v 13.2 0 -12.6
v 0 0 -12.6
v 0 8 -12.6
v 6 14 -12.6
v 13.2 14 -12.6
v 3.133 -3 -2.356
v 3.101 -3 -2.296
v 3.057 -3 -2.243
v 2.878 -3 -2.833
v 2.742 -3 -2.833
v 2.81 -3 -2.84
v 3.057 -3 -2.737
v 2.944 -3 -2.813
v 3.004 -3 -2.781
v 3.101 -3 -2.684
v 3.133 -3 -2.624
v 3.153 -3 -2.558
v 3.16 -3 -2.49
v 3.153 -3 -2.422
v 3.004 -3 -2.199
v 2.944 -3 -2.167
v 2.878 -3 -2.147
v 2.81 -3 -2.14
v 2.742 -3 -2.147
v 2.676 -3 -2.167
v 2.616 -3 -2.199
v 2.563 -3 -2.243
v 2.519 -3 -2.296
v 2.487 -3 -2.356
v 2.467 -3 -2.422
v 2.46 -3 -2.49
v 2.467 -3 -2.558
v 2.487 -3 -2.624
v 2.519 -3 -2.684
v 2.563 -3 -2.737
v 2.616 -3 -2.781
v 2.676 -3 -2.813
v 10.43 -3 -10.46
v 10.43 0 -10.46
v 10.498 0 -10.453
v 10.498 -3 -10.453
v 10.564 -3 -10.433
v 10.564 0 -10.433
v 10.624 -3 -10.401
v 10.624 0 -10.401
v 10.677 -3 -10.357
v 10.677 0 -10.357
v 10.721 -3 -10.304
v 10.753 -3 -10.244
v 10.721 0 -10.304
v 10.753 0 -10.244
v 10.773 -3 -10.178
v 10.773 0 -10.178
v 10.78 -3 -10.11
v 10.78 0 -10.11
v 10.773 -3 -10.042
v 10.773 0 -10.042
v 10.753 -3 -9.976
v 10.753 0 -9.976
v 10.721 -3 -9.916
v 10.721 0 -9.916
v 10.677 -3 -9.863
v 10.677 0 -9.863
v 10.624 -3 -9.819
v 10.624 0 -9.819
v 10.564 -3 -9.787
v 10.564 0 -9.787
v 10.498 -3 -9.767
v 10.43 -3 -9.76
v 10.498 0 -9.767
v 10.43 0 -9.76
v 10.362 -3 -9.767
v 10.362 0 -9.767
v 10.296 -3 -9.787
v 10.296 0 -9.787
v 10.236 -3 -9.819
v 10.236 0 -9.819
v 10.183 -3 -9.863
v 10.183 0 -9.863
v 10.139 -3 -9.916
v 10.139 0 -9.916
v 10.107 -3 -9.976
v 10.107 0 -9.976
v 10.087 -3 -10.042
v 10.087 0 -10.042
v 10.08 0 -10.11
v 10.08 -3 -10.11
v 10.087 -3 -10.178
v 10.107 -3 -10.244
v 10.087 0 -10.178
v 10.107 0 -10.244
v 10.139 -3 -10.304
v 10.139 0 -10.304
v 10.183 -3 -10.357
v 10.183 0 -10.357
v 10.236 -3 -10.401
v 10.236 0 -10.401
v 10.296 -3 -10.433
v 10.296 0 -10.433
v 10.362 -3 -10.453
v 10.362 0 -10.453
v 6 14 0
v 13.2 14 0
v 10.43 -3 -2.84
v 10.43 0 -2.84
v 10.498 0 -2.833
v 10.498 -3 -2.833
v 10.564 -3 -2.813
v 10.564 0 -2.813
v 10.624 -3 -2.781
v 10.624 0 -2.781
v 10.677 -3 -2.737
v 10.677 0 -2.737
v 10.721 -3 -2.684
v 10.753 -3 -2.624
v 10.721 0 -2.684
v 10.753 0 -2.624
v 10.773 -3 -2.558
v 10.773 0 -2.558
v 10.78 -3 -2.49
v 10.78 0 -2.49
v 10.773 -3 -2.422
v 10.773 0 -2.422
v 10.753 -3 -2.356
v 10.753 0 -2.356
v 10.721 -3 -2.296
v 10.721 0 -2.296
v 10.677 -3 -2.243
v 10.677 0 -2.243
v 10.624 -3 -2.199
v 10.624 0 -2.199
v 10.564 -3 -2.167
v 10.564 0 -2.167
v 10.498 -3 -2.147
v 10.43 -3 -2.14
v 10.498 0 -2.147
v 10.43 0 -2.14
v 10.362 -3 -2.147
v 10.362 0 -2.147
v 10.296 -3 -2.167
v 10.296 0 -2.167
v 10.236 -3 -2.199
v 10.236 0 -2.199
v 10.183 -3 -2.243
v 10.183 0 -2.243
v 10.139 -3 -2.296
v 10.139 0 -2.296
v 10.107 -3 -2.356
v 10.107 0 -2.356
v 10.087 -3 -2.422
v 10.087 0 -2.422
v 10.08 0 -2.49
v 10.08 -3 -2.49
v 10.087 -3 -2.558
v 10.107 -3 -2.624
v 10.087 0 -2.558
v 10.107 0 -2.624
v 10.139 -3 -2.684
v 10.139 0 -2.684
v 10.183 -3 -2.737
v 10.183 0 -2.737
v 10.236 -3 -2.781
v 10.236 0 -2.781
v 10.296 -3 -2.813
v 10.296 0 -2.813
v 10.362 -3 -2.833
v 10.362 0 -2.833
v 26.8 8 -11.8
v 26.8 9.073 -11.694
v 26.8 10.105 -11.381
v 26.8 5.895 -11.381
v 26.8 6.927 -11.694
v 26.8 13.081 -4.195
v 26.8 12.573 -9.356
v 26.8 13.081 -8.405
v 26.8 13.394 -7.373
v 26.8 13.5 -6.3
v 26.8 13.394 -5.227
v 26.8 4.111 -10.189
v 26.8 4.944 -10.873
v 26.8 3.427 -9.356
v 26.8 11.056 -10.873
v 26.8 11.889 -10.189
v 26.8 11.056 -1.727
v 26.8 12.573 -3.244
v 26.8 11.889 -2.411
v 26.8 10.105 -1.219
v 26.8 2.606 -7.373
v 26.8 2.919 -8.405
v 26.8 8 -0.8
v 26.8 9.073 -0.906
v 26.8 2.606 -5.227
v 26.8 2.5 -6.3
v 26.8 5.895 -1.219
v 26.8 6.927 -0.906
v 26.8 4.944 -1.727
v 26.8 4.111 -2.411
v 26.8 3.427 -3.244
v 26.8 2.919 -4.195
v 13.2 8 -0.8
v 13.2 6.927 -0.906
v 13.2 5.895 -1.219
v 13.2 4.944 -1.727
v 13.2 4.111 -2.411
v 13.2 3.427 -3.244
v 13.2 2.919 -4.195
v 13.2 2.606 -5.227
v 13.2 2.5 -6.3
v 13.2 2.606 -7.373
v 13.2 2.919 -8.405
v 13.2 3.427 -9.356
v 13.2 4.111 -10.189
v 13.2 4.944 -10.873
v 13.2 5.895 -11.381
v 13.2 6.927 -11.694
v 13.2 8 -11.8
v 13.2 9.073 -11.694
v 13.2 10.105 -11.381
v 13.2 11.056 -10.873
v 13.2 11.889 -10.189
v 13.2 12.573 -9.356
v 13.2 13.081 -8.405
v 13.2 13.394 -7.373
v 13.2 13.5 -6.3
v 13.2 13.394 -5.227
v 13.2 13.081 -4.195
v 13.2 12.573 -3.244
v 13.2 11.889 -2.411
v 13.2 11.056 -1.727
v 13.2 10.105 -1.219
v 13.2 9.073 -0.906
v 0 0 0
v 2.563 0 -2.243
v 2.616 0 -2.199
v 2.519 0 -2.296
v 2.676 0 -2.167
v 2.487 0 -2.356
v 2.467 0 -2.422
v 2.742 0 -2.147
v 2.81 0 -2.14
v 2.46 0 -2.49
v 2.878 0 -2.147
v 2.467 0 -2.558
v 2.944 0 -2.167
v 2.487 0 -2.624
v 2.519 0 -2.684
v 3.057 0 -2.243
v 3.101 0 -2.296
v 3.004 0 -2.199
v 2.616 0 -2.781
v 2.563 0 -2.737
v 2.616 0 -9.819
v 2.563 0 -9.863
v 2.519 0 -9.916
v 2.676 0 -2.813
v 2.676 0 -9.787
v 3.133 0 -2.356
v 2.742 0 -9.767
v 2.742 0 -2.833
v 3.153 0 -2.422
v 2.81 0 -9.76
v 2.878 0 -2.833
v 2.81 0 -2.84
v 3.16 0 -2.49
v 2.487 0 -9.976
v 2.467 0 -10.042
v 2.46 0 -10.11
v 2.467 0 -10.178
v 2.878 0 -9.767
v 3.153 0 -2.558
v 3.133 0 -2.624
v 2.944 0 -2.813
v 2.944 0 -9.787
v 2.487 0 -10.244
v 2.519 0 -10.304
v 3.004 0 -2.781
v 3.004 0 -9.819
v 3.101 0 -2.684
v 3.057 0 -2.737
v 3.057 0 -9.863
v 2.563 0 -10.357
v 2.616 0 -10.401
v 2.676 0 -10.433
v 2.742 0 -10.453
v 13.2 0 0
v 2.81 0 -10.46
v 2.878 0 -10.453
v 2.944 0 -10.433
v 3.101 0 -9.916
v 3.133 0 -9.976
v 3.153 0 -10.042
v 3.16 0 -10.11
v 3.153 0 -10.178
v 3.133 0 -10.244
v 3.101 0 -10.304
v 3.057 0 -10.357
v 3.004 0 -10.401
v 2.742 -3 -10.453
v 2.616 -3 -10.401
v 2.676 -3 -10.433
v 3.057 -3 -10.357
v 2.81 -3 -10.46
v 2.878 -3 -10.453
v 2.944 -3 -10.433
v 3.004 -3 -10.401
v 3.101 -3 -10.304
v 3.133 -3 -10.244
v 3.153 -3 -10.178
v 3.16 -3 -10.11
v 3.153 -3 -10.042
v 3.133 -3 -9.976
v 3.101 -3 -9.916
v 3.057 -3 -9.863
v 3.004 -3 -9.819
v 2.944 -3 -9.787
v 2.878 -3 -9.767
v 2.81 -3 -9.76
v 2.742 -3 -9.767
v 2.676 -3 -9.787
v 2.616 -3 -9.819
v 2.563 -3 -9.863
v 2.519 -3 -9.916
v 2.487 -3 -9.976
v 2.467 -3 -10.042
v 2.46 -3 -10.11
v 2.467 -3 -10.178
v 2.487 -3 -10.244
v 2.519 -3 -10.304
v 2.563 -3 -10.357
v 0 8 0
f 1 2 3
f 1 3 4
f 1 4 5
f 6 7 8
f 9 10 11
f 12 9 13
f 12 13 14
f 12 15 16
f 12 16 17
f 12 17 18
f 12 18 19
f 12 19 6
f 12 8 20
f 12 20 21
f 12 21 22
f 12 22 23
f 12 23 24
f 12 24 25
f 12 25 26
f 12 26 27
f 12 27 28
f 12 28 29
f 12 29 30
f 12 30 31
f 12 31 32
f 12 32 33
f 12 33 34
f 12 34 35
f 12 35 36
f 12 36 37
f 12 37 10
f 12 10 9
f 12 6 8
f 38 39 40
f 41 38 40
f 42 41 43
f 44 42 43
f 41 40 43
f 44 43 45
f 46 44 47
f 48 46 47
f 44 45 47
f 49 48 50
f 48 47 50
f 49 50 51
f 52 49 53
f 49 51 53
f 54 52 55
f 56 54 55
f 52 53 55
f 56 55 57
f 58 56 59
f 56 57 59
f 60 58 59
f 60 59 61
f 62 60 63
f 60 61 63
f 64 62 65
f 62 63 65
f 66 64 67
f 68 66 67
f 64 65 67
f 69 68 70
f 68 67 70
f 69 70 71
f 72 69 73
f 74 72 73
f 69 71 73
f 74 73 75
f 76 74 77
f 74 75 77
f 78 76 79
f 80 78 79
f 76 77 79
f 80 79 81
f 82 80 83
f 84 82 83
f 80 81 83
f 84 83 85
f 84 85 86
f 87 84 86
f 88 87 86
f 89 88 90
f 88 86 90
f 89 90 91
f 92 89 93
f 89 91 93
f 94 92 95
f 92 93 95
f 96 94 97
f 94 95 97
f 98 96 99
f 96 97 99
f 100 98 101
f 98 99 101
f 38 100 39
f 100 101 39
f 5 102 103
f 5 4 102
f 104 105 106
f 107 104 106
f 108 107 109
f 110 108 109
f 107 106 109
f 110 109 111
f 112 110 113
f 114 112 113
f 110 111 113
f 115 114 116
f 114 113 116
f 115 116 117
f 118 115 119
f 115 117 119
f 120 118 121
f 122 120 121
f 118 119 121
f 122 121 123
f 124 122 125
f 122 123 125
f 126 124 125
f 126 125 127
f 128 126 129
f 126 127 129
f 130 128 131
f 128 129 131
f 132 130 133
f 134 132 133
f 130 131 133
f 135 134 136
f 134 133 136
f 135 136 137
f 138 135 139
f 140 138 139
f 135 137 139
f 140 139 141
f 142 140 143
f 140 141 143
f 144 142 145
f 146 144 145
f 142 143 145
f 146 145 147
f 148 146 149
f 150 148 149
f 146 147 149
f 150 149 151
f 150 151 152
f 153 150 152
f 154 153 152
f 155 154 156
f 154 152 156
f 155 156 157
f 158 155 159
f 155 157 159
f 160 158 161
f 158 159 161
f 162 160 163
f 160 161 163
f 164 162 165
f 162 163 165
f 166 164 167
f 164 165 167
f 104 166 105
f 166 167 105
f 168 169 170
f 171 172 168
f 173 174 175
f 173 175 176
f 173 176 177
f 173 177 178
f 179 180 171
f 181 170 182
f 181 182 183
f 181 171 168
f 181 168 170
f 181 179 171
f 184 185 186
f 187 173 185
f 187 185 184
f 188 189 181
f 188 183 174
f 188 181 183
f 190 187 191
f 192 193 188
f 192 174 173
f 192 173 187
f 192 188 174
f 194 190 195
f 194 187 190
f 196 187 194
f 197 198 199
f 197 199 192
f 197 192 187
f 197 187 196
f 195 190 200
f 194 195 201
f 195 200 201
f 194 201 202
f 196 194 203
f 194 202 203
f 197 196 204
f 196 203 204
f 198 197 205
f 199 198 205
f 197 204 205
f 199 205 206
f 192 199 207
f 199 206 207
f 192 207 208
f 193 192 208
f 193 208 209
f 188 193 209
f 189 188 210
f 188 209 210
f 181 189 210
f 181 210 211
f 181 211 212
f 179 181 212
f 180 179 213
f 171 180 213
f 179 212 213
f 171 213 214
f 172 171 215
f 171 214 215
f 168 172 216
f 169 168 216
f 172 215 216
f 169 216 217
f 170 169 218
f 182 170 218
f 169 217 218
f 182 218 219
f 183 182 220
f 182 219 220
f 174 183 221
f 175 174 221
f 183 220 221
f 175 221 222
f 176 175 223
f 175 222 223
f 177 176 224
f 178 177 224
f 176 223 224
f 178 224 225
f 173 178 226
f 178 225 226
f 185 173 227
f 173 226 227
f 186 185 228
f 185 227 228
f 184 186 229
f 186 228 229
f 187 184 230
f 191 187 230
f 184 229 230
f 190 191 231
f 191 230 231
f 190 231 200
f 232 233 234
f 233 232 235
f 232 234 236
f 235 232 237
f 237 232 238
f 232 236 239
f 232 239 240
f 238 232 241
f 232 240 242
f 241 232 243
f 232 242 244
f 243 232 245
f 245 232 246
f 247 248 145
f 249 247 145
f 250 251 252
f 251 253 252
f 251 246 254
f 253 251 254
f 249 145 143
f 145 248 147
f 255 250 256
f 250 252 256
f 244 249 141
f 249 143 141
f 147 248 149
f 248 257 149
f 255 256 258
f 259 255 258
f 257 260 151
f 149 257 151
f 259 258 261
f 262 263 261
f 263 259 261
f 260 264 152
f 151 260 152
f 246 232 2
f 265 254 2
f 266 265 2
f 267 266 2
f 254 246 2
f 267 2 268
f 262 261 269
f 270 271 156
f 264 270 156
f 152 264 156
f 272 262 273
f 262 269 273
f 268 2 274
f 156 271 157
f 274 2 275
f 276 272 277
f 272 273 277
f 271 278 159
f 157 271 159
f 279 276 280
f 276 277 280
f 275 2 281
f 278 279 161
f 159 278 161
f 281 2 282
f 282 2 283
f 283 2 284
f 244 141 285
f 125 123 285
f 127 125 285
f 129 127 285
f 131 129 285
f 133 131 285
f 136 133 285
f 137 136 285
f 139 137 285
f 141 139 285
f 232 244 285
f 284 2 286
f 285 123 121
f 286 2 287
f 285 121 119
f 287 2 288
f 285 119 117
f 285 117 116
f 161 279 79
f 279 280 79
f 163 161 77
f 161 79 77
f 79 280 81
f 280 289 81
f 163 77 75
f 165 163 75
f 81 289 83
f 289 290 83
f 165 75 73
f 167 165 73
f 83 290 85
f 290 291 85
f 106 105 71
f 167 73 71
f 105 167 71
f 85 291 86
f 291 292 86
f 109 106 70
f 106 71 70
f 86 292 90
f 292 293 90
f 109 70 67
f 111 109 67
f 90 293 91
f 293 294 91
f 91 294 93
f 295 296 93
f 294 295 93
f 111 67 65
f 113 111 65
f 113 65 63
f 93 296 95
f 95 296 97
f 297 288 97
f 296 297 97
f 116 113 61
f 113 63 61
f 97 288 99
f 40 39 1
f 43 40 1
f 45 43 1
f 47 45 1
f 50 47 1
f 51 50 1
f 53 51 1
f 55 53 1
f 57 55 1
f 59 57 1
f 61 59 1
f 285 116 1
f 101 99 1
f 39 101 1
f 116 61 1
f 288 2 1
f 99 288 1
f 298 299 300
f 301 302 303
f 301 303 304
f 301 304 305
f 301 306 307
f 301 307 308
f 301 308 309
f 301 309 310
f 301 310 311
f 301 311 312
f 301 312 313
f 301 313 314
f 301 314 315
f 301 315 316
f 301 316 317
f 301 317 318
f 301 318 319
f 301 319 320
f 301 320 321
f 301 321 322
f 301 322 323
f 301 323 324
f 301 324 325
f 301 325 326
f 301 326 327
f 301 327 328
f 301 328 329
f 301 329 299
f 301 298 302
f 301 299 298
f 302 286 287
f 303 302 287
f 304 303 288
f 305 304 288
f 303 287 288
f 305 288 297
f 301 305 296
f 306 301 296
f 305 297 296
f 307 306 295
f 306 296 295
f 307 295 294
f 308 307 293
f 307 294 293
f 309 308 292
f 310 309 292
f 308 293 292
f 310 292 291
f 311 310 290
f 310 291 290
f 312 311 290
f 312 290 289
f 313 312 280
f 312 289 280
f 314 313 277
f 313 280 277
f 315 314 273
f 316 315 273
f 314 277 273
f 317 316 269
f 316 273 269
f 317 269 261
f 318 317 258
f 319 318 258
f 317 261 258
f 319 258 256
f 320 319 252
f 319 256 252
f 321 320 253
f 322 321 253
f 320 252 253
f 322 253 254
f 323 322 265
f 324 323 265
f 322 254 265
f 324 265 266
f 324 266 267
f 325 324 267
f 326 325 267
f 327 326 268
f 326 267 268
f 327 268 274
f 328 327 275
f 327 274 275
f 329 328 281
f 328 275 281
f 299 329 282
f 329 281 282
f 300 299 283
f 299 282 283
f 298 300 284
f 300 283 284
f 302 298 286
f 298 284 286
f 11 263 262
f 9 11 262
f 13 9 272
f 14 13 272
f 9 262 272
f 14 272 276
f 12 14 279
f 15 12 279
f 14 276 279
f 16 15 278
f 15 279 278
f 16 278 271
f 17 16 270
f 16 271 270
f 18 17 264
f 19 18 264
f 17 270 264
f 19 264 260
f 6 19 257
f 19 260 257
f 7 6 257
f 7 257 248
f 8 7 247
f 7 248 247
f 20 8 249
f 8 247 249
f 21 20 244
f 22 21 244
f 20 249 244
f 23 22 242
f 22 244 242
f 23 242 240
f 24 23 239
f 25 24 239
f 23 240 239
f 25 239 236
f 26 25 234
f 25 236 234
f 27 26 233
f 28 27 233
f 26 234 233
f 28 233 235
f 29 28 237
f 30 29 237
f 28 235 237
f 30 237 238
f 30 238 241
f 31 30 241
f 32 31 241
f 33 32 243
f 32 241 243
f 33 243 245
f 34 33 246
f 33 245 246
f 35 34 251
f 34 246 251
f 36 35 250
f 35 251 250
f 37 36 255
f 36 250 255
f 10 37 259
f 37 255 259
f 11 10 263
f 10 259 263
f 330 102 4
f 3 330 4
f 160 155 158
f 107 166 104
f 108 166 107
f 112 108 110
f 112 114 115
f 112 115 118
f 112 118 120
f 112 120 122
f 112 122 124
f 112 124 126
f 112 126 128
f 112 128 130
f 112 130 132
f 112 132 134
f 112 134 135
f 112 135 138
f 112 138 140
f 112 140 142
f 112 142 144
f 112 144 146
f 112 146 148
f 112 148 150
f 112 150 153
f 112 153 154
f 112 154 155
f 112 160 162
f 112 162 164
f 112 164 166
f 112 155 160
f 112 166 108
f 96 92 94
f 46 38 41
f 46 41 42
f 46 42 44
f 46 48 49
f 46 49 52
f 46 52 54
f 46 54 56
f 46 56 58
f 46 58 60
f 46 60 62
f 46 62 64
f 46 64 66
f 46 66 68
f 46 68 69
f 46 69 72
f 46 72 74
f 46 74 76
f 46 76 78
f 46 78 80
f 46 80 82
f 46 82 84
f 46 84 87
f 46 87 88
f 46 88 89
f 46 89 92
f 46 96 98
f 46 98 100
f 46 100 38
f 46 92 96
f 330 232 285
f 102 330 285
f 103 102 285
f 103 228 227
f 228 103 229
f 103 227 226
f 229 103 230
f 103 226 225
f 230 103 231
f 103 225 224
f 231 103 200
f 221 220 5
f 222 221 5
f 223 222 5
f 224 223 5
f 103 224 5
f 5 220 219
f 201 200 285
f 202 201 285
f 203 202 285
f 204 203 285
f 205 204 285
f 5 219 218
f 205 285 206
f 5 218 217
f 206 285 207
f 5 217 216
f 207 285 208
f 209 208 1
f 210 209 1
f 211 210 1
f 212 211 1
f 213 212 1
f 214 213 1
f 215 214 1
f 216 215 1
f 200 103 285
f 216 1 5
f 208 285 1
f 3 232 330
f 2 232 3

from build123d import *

# Parameters (mm, degrees)
ESQUISSE1_W      = 13.2
ESQUISSE1_H      = 12.6
EXTRUSION1_DEPTH = 14
CHANFREIN1_SIZE  = 6
ESQUISSE2_R      = 5.5
EXTRUSION2_DEPTH = 13.6
ESQUISSE3_R      = 0.35
EXTRUSION3_DEPTH = 3


with BuildPart() as part:
    # Esquisse1 → Extrusion1 (new body)
    with BuildSketch(Plane(origin=(0, 0, 0), x_dir=(1, 0, 0), z_dir=(0, 1, 0))):
        with Locations((6.6, 6.3)):
            Rectangle(ESQUISSE1_W, ESQUISSE1_H)
    extrude(amount=EXTRUSION1_DEPTH)

    # Chanfrein1
    chanfrein1_edges = [part.edges().sort_by_distance(p)[0] for p in [
        (0, 14, -6.3),
    ]]
    chamfer(chanfrein1_edges, length=CHANFREIN1_SIZE)

    # Esquisse2 → Extrusion2 (add)
    with BuildSketch(Plane(origin=(13.2, 0, 0), x_dir=(0, 0, -1), z_dir=(1, 0, 0))):
        with Locations(Location((6.3, 8, 0), (0, 0, 180))):
            Circle(ESQUISSE2_R)
    extrude(amount=EXTRUSION2_DEPTH)

    # Esquisse3 → Extrusion3 (add)
    with BuildSketch(Plane.XZ):
        with Locations(Location((10.43, -2.49, 0), (0, 0, 270))):
            Circle(ESQUISSE3_R)
        with Locations(Location((10.43, -10.11, 0), (0, 0, 270))):
            Circle(ESQUISSE3_R)
        with Locations(Location((2.81, -2.49, 0), (0, 0, 270))):
            Circle(ESQUISSE3_R)
        with Locations(Location((2.81, -10.11, 0), (0, 0, 270))):
            Circle(ESQUISSE3_R)
    extrude(amount=EXTRUSION3_DEPTH)


solid = part.part
